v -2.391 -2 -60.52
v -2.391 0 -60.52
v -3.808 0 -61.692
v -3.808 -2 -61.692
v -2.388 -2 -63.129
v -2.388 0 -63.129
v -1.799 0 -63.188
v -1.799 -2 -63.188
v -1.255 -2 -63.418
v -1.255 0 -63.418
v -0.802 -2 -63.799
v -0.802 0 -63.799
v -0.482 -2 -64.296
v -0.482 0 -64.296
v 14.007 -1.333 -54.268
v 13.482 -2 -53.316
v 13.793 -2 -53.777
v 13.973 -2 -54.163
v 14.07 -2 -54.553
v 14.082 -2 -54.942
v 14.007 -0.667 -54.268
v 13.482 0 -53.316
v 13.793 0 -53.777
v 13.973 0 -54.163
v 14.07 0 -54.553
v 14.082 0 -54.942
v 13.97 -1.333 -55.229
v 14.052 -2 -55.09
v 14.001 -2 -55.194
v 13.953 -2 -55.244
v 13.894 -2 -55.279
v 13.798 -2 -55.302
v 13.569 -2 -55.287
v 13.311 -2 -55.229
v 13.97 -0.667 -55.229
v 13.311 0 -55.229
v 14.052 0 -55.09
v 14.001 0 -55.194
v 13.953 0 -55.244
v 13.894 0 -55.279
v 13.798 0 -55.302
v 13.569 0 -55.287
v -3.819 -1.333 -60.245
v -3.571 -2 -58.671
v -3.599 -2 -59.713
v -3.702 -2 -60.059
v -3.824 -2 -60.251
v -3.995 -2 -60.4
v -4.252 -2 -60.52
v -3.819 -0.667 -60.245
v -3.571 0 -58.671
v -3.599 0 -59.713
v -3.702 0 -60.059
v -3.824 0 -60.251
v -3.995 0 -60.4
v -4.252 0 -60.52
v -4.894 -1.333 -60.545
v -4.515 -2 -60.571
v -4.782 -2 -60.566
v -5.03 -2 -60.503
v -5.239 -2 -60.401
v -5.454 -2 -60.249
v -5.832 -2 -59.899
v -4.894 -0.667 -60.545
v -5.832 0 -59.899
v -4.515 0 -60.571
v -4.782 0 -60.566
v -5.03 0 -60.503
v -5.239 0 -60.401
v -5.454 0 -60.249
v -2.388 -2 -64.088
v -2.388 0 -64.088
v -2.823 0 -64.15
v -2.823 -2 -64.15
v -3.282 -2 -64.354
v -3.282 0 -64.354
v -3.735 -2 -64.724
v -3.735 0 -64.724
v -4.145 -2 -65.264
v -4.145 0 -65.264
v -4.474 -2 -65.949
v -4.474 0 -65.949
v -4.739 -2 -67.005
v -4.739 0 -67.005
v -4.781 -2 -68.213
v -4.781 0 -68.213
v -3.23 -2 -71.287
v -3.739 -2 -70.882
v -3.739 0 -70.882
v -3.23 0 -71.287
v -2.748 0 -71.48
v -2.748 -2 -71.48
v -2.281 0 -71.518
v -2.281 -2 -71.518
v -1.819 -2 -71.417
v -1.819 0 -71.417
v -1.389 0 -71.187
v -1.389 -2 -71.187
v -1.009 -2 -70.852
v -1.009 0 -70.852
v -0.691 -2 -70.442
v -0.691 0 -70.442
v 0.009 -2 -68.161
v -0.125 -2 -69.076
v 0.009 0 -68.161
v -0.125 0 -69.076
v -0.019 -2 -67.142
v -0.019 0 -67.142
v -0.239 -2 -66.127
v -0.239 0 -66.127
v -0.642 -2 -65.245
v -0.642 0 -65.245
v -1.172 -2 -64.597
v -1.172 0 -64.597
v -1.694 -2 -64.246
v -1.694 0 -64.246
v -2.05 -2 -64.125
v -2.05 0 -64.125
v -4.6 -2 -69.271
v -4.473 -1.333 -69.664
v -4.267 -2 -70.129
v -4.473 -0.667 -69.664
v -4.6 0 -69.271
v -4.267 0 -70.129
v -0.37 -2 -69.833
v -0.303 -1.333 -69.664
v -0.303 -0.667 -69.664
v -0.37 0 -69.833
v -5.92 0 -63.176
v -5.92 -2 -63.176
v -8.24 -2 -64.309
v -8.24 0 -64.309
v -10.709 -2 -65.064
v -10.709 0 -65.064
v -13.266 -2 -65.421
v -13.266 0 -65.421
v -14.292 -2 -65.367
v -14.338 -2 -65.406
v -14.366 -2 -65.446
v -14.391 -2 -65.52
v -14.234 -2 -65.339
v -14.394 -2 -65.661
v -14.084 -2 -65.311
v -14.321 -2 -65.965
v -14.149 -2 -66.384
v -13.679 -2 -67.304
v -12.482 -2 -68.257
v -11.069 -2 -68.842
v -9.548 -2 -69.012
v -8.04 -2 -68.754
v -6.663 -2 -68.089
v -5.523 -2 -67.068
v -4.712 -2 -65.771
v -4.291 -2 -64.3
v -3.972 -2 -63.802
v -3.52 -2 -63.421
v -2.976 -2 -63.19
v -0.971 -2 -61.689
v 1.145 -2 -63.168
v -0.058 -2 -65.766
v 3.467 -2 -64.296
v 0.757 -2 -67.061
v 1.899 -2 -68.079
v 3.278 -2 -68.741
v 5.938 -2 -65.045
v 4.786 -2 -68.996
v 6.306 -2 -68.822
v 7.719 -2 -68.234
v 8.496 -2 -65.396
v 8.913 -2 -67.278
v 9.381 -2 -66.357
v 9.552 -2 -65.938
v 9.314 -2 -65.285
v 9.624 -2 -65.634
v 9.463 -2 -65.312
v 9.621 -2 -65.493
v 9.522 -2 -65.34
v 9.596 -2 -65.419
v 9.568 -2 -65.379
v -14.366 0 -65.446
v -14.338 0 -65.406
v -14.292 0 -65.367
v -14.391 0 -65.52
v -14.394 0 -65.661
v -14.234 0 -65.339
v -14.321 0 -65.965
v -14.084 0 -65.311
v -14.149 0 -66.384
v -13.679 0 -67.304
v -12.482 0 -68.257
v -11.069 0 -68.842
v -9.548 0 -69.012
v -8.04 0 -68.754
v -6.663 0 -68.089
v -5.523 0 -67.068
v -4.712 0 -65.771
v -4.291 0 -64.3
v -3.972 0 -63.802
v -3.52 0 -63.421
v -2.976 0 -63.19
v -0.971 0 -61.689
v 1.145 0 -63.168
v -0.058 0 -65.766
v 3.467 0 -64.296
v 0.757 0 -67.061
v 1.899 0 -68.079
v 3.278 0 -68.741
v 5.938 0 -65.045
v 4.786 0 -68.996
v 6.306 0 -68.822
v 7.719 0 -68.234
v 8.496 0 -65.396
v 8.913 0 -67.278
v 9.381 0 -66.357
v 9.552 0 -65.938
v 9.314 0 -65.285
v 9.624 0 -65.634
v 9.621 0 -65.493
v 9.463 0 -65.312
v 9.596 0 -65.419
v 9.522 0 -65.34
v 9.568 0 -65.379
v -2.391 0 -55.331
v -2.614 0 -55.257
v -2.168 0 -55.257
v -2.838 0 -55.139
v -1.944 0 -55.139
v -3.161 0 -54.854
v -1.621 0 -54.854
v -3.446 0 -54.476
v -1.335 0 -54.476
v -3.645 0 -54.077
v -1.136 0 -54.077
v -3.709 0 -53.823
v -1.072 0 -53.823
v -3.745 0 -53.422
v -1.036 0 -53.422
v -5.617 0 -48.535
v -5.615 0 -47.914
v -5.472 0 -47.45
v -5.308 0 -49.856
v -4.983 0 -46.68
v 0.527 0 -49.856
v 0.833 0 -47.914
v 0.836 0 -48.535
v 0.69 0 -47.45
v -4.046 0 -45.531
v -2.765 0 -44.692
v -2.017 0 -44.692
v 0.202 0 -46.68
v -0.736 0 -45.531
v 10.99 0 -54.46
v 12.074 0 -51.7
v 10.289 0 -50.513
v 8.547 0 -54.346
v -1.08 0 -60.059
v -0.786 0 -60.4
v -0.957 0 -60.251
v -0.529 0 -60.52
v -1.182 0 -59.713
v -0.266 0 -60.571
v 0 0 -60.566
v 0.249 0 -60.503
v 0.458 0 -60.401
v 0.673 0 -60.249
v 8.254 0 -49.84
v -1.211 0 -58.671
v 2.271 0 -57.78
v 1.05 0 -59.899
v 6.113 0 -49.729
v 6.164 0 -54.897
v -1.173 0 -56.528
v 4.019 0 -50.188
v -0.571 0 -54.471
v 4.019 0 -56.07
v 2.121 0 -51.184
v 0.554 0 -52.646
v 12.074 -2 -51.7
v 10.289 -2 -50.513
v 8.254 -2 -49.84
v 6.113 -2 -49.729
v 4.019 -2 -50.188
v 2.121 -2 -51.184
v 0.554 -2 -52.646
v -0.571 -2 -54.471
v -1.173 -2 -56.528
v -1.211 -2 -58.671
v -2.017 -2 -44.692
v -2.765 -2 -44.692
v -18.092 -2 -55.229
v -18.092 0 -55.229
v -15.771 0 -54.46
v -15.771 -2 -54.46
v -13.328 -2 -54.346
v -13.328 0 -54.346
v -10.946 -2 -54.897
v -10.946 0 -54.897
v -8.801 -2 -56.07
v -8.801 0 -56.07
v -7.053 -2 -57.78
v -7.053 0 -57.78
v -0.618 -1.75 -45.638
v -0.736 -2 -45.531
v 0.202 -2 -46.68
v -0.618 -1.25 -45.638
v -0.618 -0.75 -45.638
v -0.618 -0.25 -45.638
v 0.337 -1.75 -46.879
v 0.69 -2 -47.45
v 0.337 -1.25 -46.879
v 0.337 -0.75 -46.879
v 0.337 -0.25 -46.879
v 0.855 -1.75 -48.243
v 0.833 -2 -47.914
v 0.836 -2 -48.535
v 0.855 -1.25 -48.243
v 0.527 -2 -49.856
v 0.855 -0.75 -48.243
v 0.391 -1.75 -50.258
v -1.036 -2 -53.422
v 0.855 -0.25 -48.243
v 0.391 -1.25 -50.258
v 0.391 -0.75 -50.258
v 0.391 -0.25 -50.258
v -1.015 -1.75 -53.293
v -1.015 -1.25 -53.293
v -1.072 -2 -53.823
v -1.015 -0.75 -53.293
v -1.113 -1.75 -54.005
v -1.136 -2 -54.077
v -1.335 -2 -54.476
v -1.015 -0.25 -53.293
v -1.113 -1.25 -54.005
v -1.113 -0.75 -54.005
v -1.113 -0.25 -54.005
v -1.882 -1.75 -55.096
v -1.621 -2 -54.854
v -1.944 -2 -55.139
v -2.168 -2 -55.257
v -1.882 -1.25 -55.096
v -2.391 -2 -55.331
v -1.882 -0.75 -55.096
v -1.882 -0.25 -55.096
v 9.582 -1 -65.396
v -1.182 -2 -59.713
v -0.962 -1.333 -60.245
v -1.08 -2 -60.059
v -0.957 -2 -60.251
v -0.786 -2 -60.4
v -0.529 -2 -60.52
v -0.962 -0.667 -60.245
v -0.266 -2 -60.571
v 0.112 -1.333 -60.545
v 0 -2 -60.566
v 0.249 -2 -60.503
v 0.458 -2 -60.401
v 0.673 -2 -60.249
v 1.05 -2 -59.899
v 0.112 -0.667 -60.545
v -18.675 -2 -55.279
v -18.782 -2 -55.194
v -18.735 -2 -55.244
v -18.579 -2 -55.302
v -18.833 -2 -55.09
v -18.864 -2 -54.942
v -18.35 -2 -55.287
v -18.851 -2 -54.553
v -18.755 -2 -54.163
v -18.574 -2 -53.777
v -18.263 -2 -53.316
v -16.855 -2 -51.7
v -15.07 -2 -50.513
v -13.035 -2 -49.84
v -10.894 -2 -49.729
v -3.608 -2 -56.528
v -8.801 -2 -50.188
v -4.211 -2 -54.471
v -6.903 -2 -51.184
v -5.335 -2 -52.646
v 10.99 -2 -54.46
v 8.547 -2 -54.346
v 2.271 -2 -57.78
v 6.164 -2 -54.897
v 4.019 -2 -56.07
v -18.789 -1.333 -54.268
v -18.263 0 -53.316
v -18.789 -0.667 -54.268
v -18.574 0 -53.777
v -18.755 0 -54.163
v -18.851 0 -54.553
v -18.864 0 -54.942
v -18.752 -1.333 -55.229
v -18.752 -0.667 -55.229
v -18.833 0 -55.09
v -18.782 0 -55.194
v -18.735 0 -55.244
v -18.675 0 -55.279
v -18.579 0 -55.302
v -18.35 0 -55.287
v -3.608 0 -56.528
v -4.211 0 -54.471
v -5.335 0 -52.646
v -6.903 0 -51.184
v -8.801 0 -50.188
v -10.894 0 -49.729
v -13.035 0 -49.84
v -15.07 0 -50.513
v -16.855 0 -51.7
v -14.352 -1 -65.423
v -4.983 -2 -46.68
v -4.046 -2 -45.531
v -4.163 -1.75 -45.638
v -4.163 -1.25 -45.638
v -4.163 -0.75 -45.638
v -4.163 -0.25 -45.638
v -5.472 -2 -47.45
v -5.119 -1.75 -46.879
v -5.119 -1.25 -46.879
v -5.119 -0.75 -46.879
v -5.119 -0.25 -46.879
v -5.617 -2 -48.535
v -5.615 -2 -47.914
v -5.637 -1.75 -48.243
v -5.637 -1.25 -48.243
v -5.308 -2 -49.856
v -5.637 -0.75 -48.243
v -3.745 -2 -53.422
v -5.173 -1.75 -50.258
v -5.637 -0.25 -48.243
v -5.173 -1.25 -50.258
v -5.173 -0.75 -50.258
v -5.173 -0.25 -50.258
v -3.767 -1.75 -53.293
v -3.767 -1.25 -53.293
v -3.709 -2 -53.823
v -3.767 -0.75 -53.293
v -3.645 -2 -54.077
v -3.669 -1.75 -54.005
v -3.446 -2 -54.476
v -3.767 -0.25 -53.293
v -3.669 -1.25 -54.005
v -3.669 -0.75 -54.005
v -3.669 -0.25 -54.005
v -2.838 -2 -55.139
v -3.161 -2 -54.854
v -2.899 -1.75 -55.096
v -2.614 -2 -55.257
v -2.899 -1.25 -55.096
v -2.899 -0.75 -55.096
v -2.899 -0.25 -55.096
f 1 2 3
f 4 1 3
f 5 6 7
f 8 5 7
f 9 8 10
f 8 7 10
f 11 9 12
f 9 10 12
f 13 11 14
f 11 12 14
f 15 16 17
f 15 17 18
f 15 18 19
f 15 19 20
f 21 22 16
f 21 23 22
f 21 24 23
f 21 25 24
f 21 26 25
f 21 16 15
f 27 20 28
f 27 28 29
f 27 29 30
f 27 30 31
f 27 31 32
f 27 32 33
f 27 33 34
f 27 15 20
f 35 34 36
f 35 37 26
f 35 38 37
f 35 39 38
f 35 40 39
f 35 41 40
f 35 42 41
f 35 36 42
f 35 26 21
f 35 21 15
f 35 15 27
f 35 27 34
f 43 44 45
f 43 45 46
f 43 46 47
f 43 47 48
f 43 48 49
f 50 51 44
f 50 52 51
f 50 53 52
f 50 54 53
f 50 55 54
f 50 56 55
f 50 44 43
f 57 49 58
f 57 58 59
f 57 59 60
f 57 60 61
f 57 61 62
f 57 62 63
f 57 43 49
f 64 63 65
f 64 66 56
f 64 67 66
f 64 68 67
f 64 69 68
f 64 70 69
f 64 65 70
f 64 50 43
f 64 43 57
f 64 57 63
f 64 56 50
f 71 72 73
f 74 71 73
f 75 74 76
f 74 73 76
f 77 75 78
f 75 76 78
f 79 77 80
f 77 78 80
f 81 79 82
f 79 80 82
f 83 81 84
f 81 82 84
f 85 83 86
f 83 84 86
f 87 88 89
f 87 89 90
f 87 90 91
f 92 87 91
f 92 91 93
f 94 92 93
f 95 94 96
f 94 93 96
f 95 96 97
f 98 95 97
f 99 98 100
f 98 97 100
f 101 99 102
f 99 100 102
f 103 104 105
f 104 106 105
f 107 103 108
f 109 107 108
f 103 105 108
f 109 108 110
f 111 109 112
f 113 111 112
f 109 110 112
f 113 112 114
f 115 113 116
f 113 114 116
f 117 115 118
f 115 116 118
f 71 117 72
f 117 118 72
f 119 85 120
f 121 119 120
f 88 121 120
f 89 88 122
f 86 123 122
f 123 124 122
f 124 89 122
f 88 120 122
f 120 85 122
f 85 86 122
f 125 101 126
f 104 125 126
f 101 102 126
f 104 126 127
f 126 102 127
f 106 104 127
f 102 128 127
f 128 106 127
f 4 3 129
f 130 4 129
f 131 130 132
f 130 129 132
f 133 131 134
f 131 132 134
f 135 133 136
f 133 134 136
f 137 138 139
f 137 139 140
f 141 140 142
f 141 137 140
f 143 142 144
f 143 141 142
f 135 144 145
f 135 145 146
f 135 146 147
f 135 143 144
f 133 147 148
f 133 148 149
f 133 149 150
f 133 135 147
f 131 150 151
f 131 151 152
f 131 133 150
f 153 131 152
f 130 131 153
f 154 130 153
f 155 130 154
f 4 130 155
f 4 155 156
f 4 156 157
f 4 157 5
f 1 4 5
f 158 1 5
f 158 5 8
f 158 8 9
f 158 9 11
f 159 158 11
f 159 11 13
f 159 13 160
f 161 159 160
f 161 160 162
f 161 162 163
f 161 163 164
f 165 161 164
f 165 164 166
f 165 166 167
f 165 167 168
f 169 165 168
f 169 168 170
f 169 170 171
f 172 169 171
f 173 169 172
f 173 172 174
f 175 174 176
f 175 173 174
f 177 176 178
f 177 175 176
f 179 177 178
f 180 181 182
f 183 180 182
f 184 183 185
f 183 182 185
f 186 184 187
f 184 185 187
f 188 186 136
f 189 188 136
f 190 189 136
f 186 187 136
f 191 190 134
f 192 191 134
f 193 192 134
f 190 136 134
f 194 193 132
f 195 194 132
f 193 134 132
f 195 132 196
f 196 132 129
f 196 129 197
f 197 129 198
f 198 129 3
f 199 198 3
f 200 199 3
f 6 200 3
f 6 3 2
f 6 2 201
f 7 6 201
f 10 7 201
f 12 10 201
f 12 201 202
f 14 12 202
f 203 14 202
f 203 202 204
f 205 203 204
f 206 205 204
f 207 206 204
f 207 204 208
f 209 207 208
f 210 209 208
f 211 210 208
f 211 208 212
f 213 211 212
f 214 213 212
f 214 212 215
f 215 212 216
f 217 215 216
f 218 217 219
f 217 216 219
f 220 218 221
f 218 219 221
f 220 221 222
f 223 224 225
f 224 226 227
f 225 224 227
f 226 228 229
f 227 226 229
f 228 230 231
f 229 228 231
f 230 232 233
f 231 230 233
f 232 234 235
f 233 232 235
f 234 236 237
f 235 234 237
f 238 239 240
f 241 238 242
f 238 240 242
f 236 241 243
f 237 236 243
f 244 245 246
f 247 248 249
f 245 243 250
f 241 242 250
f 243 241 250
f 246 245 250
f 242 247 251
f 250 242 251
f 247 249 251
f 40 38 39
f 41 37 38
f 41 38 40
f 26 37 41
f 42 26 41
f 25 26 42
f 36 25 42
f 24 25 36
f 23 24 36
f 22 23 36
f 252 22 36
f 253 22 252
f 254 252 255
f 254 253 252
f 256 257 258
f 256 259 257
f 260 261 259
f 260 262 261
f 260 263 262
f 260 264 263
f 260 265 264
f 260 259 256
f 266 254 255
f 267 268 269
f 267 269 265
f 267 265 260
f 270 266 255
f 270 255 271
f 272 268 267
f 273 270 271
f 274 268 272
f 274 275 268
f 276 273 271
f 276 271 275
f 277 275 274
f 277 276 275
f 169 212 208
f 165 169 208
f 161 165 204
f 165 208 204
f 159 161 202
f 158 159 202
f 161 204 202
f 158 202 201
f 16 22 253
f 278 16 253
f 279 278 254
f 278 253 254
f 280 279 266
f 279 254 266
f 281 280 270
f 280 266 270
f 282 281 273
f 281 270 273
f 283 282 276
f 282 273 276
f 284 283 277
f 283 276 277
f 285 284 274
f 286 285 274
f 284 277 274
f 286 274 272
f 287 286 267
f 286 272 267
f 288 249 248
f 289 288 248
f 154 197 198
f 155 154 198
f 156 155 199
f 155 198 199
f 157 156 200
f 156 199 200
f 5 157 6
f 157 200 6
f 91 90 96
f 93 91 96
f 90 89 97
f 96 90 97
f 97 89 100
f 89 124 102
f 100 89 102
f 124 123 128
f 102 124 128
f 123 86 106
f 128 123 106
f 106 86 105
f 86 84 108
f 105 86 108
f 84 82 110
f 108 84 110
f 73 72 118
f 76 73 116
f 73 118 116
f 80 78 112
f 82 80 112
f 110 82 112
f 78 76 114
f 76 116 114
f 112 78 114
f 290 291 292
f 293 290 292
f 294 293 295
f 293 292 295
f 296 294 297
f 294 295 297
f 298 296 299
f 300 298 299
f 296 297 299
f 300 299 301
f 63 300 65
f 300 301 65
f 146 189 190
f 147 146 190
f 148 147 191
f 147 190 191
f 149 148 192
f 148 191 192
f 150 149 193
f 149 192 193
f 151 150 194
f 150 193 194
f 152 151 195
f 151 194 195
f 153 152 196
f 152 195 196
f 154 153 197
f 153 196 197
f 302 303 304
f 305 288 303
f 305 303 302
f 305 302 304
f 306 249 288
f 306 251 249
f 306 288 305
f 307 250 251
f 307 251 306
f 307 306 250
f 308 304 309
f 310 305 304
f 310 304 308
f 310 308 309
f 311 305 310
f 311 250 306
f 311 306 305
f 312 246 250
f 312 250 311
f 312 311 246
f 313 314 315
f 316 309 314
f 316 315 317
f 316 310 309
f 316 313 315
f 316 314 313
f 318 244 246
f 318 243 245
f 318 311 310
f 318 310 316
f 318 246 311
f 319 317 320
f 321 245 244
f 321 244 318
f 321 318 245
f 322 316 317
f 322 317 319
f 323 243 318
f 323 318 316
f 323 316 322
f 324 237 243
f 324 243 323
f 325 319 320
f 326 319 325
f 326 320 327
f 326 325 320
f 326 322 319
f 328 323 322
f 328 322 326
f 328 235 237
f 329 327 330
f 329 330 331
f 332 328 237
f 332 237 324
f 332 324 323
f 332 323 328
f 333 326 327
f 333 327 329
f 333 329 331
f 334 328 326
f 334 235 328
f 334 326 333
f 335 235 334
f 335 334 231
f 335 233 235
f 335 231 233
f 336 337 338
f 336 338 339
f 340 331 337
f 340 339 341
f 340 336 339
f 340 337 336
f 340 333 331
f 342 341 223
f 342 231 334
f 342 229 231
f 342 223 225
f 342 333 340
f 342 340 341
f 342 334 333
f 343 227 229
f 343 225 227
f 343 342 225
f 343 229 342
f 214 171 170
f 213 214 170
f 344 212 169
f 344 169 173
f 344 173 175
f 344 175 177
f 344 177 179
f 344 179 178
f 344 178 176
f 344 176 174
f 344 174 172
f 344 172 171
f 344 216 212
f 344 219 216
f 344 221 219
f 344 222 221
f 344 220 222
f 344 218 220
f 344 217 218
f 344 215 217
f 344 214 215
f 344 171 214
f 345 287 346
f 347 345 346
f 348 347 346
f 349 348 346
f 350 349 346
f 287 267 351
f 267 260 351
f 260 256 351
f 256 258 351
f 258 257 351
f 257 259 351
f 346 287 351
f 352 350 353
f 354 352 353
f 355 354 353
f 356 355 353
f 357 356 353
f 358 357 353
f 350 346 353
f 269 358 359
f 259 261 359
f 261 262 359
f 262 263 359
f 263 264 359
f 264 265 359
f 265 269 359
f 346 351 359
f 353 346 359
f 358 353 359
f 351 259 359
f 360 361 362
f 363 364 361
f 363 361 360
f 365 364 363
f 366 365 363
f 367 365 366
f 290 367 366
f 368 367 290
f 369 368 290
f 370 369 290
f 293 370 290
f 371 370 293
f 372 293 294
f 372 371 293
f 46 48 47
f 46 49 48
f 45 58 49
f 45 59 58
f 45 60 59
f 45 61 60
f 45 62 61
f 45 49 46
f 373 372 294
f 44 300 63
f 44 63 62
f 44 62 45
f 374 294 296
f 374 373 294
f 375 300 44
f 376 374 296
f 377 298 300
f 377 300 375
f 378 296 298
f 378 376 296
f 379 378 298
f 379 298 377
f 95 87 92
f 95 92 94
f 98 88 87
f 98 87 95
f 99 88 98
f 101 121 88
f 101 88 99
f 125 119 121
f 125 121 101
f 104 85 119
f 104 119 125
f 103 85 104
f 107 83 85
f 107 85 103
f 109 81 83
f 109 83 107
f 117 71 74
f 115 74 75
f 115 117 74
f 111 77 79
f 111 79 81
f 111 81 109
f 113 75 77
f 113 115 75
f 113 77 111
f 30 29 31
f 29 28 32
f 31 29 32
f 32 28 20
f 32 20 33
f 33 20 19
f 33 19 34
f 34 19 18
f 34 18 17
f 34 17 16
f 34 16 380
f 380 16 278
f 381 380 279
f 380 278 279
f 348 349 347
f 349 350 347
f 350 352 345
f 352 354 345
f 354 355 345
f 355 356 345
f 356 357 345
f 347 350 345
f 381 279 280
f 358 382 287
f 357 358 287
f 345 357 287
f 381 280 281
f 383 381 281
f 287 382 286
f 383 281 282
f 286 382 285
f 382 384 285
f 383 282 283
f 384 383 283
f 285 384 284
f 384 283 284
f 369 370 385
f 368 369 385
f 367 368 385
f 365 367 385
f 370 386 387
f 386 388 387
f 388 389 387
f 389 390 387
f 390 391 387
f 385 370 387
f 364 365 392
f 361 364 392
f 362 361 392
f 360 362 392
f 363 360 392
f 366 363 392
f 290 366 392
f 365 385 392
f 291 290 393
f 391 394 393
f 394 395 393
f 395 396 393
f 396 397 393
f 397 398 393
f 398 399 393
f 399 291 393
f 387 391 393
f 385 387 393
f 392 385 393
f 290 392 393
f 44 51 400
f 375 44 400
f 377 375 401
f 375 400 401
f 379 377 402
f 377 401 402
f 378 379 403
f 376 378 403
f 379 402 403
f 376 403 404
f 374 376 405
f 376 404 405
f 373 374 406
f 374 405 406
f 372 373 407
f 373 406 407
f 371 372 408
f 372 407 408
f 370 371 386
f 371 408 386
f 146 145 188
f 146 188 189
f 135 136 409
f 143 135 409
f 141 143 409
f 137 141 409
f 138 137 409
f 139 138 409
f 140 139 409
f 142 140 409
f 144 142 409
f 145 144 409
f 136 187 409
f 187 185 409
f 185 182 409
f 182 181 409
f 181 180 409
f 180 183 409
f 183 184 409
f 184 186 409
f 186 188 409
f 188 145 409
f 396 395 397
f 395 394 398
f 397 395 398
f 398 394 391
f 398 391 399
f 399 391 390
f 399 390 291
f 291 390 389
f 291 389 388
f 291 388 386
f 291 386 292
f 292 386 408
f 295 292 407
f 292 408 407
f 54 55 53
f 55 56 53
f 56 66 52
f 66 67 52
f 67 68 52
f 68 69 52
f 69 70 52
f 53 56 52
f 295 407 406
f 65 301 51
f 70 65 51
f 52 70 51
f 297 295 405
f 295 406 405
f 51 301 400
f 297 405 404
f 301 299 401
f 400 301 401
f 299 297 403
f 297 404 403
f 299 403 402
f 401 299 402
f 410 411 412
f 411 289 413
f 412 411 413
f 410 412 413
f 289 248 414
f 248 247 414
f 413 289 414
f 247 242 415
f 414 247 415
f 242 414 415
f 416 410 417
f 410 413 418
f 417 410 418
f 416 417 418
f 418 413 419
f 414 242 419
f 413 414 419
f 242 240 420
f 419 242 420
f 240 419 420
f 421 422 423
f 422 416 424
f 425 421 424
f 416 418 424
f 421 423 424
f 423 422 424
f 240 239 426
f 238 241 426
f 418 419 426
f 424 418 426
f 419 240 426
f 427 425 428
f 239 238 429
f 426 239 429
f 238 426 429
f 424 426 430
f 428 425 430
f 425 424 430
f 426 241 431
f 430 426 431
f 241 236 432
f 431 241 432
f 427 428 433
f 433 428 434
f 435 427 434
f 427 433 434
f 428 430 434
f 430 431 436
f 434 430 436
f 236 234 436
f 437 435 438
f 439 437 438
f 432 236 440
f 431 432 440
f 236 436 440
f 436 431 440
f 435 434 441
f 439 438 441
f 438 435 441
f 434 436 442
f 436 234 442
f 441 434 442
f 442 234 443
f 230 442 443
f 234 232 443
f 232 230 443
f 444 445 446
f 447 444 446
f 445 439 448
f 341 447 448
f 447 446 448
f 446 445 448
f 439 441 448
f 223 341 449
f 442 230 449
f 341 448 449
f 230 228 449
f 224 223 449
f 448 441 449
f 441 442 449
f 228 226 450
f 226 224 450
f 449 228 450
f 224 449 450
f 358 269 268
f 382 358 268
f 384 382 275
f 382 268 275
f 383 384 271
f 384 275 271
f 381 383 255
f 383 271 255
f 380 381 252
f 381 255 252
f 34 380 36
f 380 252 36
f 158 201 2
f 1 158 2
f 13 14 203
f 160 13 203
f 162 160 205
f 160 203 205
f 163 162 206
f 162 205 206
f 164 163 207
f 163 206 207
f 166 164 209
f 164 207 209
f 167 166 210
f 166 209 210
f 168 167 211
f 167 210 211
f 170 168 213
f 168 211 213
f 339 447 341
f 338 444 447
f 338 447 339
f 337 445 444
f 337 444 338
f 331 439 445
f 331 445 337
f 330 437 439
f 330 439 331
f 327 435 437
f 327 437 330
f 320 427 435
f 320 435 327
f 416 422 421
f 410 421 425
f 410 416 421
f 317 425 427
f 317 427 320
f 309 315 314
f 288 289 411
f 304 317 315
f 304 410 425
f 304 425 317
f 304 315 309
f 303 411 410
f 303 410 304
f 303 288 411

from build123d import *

# Parameters (mm, degrees)
F1_DEPTH = 2


with BuildPart() as f1:
    # F0 (on Front) → F1 (new body)
    with BuildSketch(Plane.XZ):
        with BuildLine():
            ThreePointArc((-18.0919896811, -55.2291944623), (-10.9458235901, -54.8965303051), (-5.8318637311, -59.8991066217))
            add(Edge.make_bspline(
                [(-3.5705678165, -58.6713254452), (-3.5496082749, -59.2859355832), (-3.5111098077, -60.4148509372), (-4.9889583016, -60.732946334), (-5.5499172433, -60.1780206851), (-5.8318637311, -59.8991066217)],
                knots=[0, 0, 0, 0, 0.3728007809, 0.6847601421, 1, 1, 1, 1], degree=3))
            ThreePointArc((-3.5705678165, -58.6713254452), (-8.8006084463, -50.1880485591), (-18.2629041374, -53.3160306513))
            add(Edge.make_bspline(
                [(-18.2629041374, -53.3160306513), (-18.4697846701, -53.6013179281), (-18.8711867665, -54.1548495216), (-18.9327157142, -55.4390173228), (-18.3541098992, -55.2946126982), (-18.0919896811, -55.2291944623)],
                knots=[0, 0, 0, 0, 0.3677816877, 0.7135922288, 1, 1, 1, 1], degree=3))
        make_face()
    extrude(amount=F1_DEPTH)


with BuildPart() as f1b:
    # F0 (on Front) → F1, piece 2 (new body)
    with BuildSketch(Plane.XZ):
        with BuildLine():
            ThreePointArc((8.4956283298, -65.3960779309), (3.4673185055, -64.2956643723), (-0.9710662217, -61.688836664))
            Line((-0.9710662217, -61.688836664), (-2.3906983761, -60.5198784534))
            Line((-2.3906983761, -60.5198784534), (-3.8076553843, -61.6920779196))
            ThreePointArc((-3.8076553843, -61.6920779196), (-8.2400710963, -64.3090419325), (-13.2658529971, -65.4209438947))
            add(Edge.make_bspline(
                [(-13.2658529971, -65.4209438947), (-13.7398833858, -65.3238484522), (-14.8566959584, -65.095092209), (-14.1091456657, -66.4969594875), (-13.678892621, -67.3038050882)],
                knots=[0, 0, 0, 0, 0.4244493662, 1, 1, 1, 1], degree=3))
            ThreePointArc((-13.678892621, -67.3038050882), (-8.0402203766, -68.7543854385), (-4.2908993589, -64.3000168033))
            ThreePointArc((-4.2908993589, -64.3000168033), (-3.5200603549, -63.4208150699), (-2.3877167061, -63.1292909384))
            ThreePointArc((-2.3877167061, -63.1292909384), (-1.2547097894, -63.4182265455), (-0.4818635445, -64.2956643723))
            ThreePointArc((-0.4818635445, -64.2956643723), (3.2776273226, -68.7414529921), (8.9129698079, -67.2779902816))
            add(Edge.make_bspline(
                [(8.4956283298, -65.3960779309), (8.9694355868, -65.2978994327), (10.0857224628, -65.0665915171), (9.341377832, -66.4701635237), (8.9129698079, -67.2779902816)],
                knots=[0, 0, 0, 0, 0.4244493662, 1, 1, 1, 1], degree=3))
        make_face()
    extrude(amount=F1_DEPTH)


with BuildPart() as f1c:
    # F0 (on Front) → F1, piece 3 (new body)
    with BuildSketch(Plane.XZ):
        with BuildLine():
            Line((-2.3906983761, -44.6919649839), (-2.7647726238, -44.6919649839))
            add(Edge.make_bspline(
                [(-2.7647726238, -44.6919649839), (-3.2641099199, -44.9733404241), (-4.2443981266, -45.5257306178), (-5.121654191, -46.9205636641), (-6.0799012484, -48.1854359933), (-4.4324907097, -52.2525460687), (-3.6707774763, -53.2190479357), (-3.7986865588, -54.0331424262), (-3.0539579851, -55.098790223), (-2.5597081239, -55.2870226826), (-2.3906983761, -55.3307562244)],
                knots=[0, 0, 0, 0, 0.1324221084, 0.2599682262, 0.3830802944, 0.5914580326, 0.7038529671, 0.7902455452, 0.9079807609, 0.9693365425, 0.9693365425, 0.9693365425, 0.9693365425], degree=3))
            Line((-2.3906983761, -55.3307562244), (-2.3906983761, -44.6919649839))
        make_face()
        with BuildLine():
            Line((-2.3906983761, -44.6919649839), (-2.3906983761, -55.3307562244))
            add(Edge.make_bspline(
                [(-2.0166241284, -44.6919649839), (-1.5172868323, -44.9733404241), (-0.5369986255, -45.5257306178), (0.3402574388, -46.9205636641), (1.2985044962, -48.1854359933), (-0.3489060424, -52.2525460687), (-1.1106192759, -53.2190479357), (-0.9827101934, -54.0331424262), (-1.727438767, -55.098790223), (-2.2216886283, -55.2870226826), (-2.3906983761, -55.3307562244)],
                knots=[0, 0, 0, 0, 0.1324221084, 0.2599682262, 0.3830802944, 0.5914580326, 0.7038529671, 0.7902455452, 0.9079807609, 0.9693365425, 0.9693365425, 0.9693365425, 0.9693365425], degree=3))
            Line((-2.0166241284, -44.6919649839), (-2.3906983761, -44.6919649839))
        make_face()
    extrude(amount=F1_DEPTH)


with BuildPart() as f1d:
    # F0 (on Front) → F1, piece 4 (new body)
    with BuildSketch(Plane.XZ):
        with BuildLine():
            add(Edge.make_bspline(
                [(-2.3877167061, -64.0883594751), (-6.5580815108, -64.0883594751), (-4.4728991084, -69.663643837), (-2.3877167061, -75.2389281988), (-0.3025343037, -69.663643837), (1.7826480987, -64.0883594751), (-2.3877167061, -64.0883594751)],
                knots=[0, 0, 0, 2.0943951024, 2.0943951024, 4.1887902048, 4.1887902048, 6.2831853072, 6.2831853072, 6.2831853072], degree=2, weights=[1, 0.5, 1, 0.5, 1, 0.5, 1]))
        make_face()
    extrude(amount=F1_DEPTH)


with BuildPart() as f1e:
    # F0 (on Front) → F1, piece 5 (new body)
    with BuildSketch(Plane.XZ):
        with BuildLine():
            add(Edge.make_bspline(
                [(13.4815073852, -53.3160306513), (13.688387918, -53.6013179281), (14.0897900144, -54.1548495216), (14.1513189621, -55.4390173228), (13.5727131471, -55.2946126982), (13.310592929, -55.2291944623)],
                knots=[0, 0, 0, 0, 0.3677816877, 0.7135922288, 1, 1, 1, 1], degree=3))
            ThreePointArc((13.4815073852, -53.3160306513), (4.0192116942, -50.1880485591), (-1.2108289356, -58.6713254452))
            add(Edge.make_bspline(
                [(-1.2108289356, -58.6713254452), (-1.2317884772, -59.2859355832), (-1.2702869445, -60.4148509372), (0.2075615495, -60.732946334), (0.7685204911, -60.1780206851), (1.050466979, -59.8991066217)],
                knots=[0, 0, 0, 0, 0.3728007809, 0.6847601421, 1, 1, 1, 1], degree=3))
            ThreePointArc((1.050466979, -59.8991066217), (6.1644268379, -54.8965303051), (13.310592929, -55.2291944623))
        make_face()
    extrude(amount=F1_DEPTH)


solid = Compound([f1.part, f1b.part, f1c.part, f1d.part, f1e.part])
